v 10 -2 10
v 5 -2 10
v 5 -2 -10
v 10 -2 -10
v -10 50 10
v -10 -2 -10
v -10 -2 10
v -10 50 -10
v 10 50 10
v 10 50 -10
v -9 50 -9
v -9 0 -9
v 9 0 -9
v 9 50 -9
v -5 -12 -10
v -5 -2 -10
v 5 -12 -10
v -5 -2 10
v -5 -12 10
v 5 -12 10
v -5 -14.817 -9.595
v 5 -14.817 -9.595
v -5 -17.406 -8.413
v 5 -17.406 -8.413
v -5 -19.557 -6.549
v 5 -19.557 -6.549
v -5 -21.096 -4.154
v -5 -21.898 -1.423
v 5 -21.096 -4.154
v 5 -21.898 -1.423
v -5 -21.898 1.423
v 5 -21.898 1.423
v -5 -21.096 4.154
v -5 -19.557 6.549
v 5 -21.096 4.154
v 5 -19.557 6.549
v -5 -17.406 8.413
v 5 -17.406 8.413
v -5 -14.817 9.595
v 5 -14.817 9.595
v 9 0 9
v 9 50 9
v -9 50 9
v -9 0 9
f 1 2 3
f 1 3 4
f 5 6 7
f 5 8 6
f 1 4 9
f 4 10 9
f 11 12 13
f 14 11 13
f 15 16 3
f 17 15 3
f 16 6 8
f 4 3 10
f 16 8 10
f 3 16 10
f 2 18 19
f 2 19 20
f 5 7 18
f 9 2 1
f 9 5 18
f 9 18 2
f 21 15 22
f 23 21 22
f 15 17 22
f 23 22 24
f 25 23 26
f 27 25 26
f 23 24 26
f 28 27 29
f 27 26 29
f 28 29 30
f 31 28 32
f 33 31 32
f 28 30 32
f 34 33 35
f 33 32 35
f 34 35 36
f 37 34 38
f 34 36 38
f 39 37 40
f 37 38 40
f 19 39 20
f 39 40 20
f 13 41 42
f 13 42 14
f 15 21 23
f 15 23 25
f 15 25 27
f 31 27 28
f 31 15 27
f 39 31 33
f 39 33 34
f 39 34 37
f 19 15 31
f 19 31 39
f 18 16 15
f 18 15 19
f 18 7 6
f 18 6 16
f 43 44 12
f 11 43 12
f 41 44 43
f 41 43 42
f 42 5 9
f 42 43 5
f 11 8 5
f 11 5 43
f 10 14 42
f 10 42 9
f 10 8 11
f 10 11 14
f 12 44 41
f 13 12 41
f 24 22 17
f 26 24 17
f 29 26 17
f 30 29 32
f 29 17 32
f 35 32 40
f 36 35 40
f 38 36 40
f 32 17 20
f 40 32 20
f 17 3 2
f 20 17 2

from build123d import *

# Parameters (mm, degrees)
SKETCH_1_W      = 20
SKETCH_1_H      = 20
SKETCH_1_W_2    = 18
SKETCH_1_H_2    = 18
EXTRUDE_1_DEPTH = 50
SKETCH_2_W      = 20
SKETCH_2_H      = 20
EXTRUDE_2_DEPTH = 2
EXTRUDE_3_DEPTH = 5


with BuildPart() as part:
    # 草图1 → 凸台-拉伸1 (new body)
    with BuildSketch(Plane(origin=(0, 0, 0), x_dir=(1, 0, 0), z_dir=(0, 1, 0))):
        Rectangle(SKETCH_1_W, SKETCH_1_H)
        Rectangle(SKETCH_1_W_2, SKETCH_1_H_2, mode=Mode.SUBTRACT)
    extrude(amount=EXTRUDE_1_DEPTH)

    # 草图2 → 凸台-拉伸2 (add)
    with BuildSketch(Plane.XZ):
        Rectangle(SKETCH_2_W, SKETCH_2_H)
    extrude(amount=EXTRUDE_2_DEPTH)

    # 草图6 → 凸台-拉伸3 (add, symmetric)
    with BuildSketch(Plane(origin=(0, 0, 0), x_dir=(0, 0, -1), z_dir=(1, 0, 0))):
        with BuildLine():
            Line((-10, -2), (10, -2))
            Line((10, -2), (10, -12))
            ThreePointArc((10, -12), (0, -22), (-10, -12))
            Line((-10, -12), (-10, -2))
        make_face()
    extrude(amount=EXTRUDE_3_DEPTH, both=True)


solid = part.part
